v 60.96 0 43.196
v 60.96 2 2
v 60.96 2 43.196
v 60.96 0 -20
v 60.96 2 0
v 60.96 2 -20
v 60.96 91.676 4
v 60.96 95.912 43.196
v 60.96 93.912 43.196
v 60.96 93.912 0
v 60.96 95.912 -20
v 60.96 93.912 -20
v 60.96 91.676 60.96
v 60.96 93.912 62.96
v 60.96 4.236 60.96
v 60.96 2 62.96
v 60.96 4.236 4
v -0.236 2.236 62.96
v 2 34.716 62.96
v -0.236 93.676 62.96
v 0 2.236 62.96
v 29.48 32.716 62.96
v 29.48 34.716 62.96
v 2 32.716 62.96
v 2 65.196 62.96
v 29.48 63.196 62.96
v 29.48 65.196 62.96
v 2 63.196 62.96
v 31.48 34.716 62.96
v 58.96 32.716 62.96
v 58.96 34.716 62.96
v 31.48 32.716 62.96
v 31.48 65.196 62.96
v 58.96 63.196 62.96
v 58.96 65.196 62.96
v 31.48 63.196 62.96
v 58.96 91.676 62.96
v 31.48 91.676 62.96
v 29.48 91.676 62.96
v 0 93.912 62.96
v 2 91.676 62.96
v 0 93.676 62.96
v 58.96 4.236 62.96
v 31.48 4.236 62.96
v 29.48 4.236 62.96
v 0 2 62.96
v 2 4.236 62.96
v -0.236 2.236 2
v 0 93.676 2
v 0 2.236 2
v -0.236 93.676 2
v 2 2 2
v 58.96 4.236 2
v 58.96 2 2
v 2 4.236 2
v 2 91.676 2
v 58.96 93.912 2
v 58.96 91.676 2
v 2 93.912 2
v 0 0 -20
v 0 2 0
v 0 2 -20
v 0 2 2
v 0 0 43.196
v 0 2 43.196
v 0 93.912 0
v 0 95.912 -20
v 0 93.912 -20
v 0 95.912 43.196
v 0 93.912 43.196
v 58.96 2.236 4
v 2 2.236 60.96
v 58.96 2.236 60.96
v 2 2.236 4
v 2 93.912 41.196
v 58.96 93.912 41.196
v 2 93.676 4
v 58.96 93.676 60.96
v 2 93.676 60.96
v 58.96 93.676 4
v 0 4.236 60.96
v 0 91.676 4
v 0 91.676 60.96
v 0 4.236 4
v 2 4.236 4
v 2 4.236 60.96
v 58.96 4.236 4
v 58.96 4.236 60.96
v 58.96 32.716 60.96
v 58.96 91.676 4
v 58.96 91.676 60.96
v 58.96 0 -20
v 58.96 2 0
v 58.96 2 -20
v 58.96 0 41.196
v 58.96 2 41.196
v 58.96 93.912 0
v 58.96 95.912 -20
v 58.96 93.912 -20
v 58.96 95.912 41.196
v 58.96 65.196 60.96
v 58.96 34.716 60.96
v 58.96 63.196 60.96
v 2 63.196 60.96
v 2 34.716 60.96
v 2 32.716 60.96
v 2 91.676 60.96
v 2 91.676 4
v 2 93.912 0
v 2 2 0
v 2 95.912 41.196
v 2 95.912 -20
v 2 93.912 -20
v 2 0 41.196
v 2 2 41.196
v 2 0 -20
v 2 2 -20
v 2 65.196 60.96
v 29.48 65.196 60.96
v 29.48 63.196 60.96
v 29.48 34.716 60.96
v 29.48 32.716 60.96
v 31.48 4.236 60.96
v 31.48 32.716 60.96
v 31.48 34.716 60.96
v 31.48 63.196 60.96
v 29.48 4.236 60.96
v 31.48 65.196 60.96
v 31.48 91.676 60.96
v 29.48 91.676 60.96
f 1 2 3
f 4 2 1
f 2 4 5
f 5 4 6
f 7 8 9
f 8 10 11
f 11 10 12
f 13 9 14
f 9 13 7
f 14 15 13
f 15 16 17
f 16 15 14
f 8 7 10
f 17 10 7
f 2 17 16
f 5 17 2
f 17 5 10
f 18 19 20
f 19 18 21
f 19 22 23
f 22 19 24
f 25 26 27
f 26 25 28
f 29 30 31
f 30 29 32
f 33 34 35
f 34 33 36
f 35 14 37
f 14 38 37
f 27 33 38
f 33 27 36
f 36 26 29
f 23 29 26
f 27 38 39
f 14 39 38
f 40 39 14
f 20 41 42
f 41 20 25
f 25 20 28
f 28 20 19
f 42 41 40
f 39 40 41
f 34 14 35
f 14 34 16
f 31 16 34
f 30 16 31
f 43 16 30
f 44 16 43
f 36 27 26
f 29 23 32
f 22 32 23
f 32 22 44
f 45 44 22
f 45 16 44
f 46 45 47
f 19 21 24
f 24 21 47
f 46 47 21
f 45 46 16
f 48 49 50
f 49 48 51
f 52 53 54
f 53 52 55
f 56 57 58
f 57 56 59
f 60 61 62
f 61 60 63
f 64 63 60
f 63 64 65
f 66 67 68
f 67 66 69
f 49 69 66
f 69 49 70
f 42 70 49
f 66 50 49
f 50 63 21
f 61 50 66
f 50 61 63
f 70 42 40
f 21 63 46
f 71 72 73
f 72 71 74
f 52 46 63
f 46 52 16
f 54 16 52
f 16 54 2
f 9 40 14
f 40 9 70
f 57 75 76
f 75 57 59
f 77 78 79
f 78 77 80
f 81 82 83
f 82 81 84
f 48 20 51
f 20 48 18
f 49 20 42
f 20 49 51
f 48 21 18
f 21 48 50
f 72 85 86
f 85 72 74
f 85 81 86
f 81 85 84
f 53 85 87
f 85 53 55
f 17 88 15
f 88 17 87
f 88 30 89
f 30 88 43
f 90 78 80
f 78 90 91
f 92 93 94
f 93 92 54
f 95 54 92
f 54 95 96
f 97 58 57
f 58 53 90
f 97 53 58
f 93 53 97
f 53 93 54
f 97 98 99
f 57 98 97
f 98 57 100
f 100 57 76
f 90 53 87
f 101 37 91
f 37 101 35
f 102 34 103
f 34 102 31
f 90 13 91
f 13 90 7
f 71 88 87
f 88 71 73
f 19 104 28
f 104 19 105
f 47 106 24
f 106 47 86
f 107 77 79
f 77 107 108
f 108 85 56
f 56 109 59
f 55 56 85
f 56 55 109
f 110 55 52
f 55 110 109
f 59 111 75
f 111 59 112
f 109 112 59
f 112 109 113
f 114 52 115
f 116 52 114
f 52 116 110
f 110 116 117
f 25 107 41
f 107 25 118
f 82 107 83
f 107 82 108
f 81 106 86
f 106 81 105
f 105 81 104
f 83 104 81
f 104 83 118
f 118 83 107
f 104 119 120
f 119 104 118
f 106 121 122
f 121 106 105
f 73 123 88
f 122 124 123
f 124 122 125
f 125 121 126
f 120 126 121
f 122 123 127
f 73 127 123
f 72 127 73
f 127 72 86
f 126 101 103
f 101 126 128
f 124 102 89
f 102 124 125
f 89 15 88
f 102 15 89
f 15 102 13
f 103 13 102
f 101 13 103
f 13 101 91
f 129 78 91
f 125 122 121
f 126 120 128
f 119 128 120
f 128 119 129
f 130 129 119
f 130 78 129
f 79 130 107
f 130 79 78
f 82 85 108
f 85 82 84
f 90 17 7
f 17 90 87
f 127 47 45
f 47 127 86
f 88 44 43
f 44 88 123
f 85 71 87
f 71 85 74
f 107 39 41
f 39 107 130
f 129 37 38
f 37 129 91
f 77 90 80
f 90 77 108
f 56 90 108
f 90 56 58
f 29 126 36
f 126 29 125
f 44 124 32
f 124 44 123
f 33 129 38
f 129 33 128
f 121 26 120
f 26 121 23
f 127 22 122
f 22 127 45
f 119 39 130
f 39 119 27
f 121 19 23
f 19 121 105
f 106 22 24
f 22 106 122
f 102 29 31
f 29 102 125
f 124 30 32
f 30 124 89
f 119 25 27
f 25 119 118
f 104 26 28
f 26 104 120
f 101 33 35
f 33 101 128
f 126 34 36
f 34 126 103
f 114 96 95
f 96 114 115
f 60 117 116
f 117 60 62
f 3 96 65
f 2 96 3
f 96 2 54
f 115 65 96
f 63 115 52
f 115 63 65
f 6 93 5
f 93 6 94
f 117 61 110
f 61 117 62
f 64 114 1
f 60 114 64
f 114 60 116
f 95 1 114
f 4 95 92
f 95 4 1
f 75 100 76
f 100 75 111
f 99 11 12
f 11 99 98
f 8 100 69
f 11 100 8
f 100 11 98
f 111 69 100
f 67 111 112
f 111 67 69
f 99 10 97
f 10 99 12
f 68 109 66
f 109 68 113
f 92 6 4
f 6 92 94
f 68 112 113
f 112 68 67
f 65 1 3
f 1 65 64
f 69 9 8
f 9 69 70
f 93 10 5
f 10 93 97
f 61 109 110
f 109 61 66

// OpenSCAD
//1' = 30.48 cm
//2' = 60.96 cm
//3' = 91.44 cm



// 
// 0.100" x 24" x 48" Clear Acrylic Sheet $31.99 Menards
// 0.118" x 24" x 48" Clear Acrylic Sheet $29.99 Menards
// 0.220" x 24" x 48" Clear Acrylic Sheet $60.87 Menards
// 0.220" x 36" x 72" Clear Colorless Acrylic Sheet $119.00 Mendards
// 0.093" x 36" x 48" Clear Polycarbonate Sheet $69.98 Menards
// 36 in. x 48 in. x .093 in. Acrylic Sheet OPTIX $39.58 HomeDepot
// 0.220" x 36" x 72" Clear Colorless Acrylic Sheet $39.58 HomeDepot
// 24 in. x 48 in. x .093 in. Acrylic Sheet $29.47 HomeDepot


// 0.093 in = 0.23622 cm

ts = 2;
length = 60.96;
width = 91.44;
height = 60.96;

c = 255;
plexiglass_thickness = 0.23622;
glass_color = [204/c, 255/c, 255/c, 40/c];

translate([0, ts+plexiglass_thickness, ts]){
plexiglass(length, width, height);
color("silver")
frame(length, width, height);
}
cart(length, width + plexiglass_thickness*2, height + plexiglass_thickness);

module cart(outside_length, outside_width, outside_height) {
    l = outside_length;
    w = outside_width;
    h = outside_height;
    
    translate([0,0,-20]) {
        // Back left post.
        translate([0, 0, 0,])
        {
            cube([ts,ts,h]);
        }
        echo("Post: ", ts, " x ", ts, " x ", h);

        // Front right post.
        translate([l-ts, w+ts, 0]){
            cube([ts,ts,h]);
        }
        echo("Post: ", ts, " x ", ts, " x ", h);

        // Front left post.
        translate([l-ts, 0, 0]) {
            cube([ts,ts,h]);
        }
        echo("Post: ", ts, " x ", ts, " x ", h);

        // Back right post.
        translate([0, w+ts, 0]) {
            cube([ts,ts,h]);
        }
        echo("Post: ", ts, " x ", ts, " x ", h);
    
        // Top left beam.
        translate([0,0, h]) {
            cube([l,ts,ts]);
        } 
        echo("Beam: ", ts, " x ", ts, " x ", l-2*ts);
        
        // Top right beam.
        translate([0,w+ts, h]) {
            cube([l,ts,ts]);
        } 
    }
        
                // Bottom front beam.
        translate([l-ts,ts,0]) {
            cube([ts, w, ts]);
        }
        echo("Beam: ", ts, " x ", ts, " x ", w-2*ts);
        
        // Bottom rear beam.
        translate([0,ts,0]) {
            cube([ts, w, ts]);
        }
         echo("Beam: ", ts, " x ", ts, " x ", w-2*ts);
        
}

module plexiglass(outside_length, outside_width, outside_height) {
    
    l = outside_length;
    w = outside_width;
    h = outside_height;
    
    // Left plexiglass
    translate([0,-plexiglass_thickness,0]) {
        color(glass_color) cube([l, plexiglass_thickness, h]);
    }

    // Right plexiglass
    translate([0,w,0]) {
        color(glass_color) cube([l, plexiglass_thickness, h]);
    }
    echo("plexiglass: ", plexiglass_thickness, " x ", h, " x ", l);

    // Back plexiglass
    translate([-plexiglass_thickness,0,0]) {
        color(glass_color) cube([plexiglass_thickness, w, h]);
    }
    echo("plexiglass: ", plexiglass_thickness, " x ", w, " x ", l);

    // Top plexiglass
//    translate([0,0,h]) {
//        color(glass_color) cube([l, w, plexiglass_thickness]);
//    }
    echo("plexiglass: ", plexiglass_thickness, " x ", w, " x ", l);
}



module frame(outside_length, outside_width, outside_height) {
    l = outside_length;
    w = outside_width;
    h = outside_height;
    
        // Back left post.
        translate([0, 0, 0,])
        {
            cube([ts,ts,h]);
        }
        echo("Post: ", ts, " x ", ts, " x ", h);

        // Front right post.
        translate([l-ts, w-ts, 0]){
            cube([ts,ts,h]);
        }
        echo("Post: ", ts, " x ", ts, " x ", h);

        // Front left post.
        translate([l-ts, 0, 0]) {
            cube([ts,ts,h]);
        }
        echo("Post: ", ts, " x ", ts, " x ", h);

        // Back right post.
        translate([0, w-ts, 0]) {
            cube([ts,ts,h]);
        }
        echo("Post: ", ts, " x ", ts, " x ", h);

        // Top rear beam.
        translate([0,ts,h-ts]) {
            cube([ts, w-2*ts, ts]);
        }
        echo("Beam: ", ts, " x ", ts, " x ", w-2*ts);
        
        // Bottom rear beam.
        translate([0,ts,0]) {
            cube([ts, w-2*ts, ts]);
        }
         echo("Beam: ", ts, " x ", ts, " x ", w-2*ts);

        // Top front beam.
        translate([l-ts,ts,h-ts]) {
            cube([ts, w-2*ts, ts]);
        }
        echo("Beam: ", ts, " x ", ts, " x ", w-2*ts);

        // Bottom front beam.
        translate([l-ts,ts,0]) {
            cube([ts, w-2*ts, ts]);
        }
        echo("Beam: ", ts, " x ", ts, " x ", w-2*ts);

        // Top left beam.
        translate([ts,0, h-ts]) {
            cube([l-2*ts,ts,ts]);
        } 
        echo("Beam: ", ts, " x ", ts, " x ", l-2*ts);

        // Bottom left beam.
        translate([ts,0, 0]) {
            cube([l-2*ts,ts,ts]);
        }
        echo("Beam: ", ts, " x ", ts, " x ", l-2*ts);
        
        // Top right beam.
        translate([ts,w-ts, h-ts]) {
            cube([l-2*ts,ts,ts]);
        } 
        echo("Beam: ", ts, " x ", ts, " x ", l-2*ts);
        
        // Bottom right beam.
        translate([ts,w-ts, 0]) {
            cube([l-2*ts,ts,ts]);
        }
        echo("Beam: ", ts, " x ", ts, " x ", l-2*ts);
        

        // Center support.
        translate([l/2-.5*ts,ts,h-ts]) {
            cube([ts, w-2*ts, ts]);
        }
        echo("large Support ", ts, " x ", ts, " x ", (w/2)-ts);
        
        // Top rear left support
        translate([ts,w/3, h-ts]) {
            cube([l/2-1.5*ts,ts,ts]);
        }
        echo("small Support ", ts, " x ", ts, " x ", l/2-1.5*ts);
        
        // Top front left support
        translate([l/2+.5*ts,w/3, h-ts]) {
            cube([l/2-1.5*ts,ts,ts]);
        }
        echo("small Support ", ts, " x ", ts, " x ", l/2-1.5*ts);
        
        // Top rear right support
        translate([ts,w*(2/3), h-ts]) {
            cube([l/2-1.5*ts,ts,ts]);
        }
        echo("small Support ", ts, " x ", ts, " x ", l/2-1.5*ts);
        
        // Top front right support
        translate([l/2+.5*ts,w*(2/3), h-ts]) {
            cube([l/2-1.5*ts,ts,ts]);
        }
        echo("small Support ", ts, " x ", ts, " x ", l/2-1.5*ts);
}
